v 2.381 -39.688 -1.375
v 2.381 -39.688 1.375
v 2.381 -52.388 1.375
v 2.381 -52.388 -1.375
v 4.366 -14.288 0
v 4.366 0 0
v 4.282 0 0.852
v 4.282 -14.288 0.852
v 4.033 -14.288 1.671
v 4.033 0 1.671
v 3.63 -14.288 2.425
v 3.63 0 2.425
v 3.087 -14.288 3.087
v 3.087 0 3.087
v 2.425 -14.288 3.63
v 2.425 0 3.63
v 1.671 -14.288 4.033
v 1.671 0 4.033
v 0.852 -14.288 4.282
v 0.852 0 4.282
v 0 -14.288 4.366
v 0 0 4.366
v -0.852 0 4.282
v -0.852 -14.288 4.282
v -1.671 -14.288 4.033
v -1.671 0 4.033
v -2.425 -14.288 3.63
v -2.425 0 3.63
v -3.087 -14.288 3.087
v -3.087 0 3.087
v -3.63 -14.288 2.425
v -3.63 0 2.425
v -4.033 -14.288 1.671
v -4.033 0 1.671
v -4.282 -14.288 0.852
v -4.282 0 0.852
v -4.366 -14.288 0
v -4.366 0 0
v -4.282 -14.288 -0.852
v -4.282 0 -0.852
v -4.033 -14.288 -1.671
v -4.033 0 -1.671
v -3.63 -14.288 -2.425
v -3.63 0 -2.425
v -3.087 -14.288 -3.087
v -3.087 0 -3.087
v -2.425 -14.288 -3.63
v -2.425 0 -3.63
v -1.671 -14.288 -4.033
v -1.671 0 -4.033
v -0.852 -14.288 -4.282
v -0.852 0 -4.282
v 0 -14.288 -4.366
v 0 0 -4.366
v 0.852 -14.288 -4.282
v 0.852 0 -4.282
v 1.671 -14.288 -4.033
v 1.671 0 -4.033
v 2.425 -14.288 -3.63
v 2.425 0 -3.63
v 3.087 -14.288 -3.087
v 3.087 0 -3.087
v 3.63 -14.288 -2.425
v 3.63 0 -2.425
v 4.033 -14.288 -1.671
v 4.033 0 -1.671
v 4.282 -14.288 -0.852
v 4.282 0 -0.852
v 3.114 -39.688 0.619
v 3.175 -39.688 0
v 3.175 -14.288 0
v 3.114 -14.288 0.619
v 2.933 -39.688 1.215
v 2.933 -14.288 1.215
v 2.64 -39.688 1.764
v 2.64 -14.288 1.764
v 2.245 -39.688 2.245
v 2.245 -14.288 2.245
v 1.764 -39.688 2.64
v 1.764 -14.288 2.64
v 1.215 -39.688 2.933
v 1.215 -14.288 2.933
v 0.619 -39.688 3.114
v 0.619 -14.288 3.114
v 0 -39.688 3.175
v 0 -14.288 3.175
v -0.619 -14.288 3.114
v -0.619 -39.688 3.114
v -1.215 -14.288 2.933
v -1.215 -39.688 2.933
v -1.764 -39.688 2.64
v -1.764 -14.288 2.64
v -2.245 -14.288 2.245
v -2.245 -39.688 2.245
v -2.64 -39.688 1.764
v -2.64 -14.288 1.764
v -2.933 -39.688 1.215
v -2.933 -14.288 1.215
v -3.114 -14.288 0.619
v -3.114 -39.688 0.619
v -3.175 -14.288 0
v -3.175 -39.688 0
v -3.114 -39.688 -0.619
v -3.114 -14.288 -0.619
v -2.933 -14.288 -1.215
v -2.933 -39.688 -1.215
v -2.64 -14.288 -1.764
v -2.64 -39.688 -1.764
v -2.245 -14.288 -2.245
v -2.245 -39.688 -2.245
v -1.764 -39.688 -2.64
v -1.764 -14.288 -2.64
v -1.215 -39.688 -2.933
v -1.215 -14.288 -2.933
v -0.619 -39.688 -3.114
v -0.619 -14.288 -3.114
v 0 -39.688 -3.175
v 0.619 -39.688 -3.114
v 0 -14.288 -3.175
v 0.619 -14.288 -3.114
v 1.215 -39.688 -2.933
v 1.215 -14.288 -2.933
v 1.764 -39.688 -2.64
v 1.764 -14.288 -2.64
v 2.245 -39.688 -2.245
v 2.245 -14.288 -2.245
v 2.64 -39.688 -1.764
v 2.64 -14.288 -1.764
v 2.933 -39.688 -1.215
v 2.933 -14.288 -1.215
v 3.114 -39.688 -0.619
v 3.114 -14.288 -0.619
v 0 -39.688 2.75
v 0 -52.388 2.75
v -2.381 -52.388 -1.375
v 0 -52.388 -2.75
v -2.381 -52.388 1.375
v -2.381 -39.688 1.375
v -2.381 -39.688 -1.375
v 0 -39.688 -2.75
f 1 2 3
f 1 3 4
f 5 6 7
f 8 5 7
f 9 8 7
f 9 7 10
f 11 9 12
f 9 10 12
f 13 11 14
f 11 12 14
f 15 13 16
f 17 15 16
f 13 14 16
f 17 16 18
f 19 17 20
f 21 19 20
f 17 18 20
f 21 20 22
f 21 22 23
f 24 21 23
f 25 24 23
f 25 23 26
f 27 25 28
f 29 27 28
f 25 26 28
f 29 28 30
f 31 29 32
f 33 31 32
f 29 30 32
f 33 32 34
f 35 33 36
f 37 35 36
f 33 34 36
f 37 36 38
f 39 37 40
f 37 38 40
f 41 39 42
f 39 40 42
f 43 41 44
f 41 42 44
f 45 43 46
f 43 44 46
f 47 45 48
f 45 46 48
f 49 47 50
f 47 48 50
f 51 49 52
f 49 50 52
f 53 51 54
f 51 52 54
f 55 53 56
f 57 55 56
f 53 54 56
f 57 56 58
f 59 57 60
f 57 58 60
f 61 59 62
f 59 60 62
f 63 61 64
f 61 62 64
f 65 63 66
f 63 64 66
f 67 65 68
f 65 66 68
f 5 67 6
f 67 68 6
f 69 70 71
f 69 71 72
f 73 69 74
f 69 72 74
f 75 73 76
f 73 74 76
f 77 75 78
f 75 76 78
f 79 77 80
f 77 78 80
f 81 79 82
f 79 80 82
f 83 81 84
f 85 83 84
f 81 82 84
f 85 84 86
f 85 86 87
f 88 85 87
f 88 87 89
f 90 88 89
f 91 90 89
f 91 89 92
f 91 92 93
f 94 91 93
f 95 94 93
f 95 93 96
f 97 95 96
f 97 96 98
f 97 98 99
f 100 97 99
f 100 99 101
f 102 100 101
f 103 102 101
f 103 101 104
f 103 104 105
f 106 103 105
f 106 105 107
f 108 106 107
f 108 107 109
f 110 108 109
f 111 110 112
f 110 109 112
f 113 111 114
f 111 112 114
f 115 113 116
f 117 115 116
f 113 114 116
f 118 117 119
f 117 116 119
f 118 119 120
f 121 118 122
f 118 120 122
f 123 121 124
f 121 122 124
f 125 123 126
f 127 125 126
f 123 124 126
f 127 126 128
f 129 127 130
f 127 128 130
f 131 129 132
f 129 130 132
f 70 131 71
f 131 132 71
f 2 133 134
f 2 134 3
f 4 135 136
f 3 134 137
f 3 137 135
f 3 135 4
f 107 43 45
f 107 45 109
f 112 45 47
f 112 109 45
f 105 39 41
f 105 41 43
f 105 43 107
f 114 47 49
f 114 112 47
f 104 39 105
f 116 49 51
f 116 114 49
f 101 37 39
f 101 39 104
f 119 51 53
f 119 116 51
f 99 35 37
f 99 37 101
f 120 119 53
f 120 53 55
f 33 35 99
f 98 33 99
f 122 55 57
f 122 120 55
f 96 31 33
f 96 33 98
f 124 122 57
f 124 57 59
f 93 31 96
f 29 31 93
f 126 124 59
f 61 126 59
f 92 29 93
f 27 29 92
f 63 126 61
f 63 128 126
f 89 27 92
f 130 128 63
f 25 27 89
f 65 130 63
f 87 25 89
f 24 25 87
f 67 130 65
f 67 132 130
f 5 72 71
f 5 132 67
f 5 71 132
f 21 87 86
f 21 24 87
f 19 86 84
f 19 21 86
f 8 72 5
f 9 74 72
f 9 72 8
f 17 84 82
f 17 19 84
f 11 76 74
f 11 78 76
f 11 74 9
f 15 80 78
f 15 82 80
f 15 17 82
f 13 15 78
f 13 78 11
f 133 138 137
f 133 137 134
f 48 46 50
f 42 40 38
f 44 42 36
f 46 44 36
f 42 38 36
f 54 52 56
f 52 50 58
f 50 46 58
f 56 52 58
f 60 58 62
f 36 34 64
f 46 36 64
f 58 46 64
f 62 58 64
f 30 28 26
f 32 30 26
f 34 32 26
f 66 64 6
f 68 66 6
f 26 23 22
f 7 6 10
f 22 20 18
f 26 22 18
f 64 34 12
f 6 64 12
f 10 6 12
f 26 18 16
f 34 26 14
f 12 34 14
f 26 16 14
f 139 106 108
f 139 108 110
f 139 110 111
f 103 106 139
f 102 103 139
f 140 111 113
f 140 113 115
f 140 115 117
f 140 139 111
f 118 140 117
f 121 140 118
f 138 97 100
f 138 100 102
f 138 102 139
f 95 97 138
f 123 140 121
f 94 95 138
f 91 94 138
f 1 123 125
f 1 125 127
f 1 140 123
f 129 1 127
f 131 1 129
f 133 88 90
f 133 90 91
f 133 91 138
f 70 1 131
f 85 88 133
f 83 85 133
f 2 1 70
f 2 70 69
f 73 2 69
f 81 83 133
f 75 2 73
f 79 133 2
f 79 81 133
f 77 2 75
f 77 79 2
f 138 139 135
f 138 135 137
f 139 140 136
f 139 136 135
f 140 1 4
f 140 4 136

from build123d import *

# Parameters (mm, degrees)
F0_R     = 4.365625
F1_DEPTH = 14.2875
F2_R     = 3.175
F3_DEPTH = 38.1
F4_R     = 3.175
F5_DEPTH = 12.7


with BuildPart() as f1:
    # F0 (on Front) → F1 (new body)
    with BuildSketch(Plane.XZ):
        Circle(F0_R)
    extrude(amount=F1_DEPTH)

    # F2 (on face) → F3 (join)
    with BuildSketch(Plane.XZ.offset(14.2875)):
        Circle(F2_R)
    extrude(amount=F3_DEPTH)

    # F4 (on face) → F5 (cut)
    with BuildSketch(Plane.XZ.offset(52.3875)):
        Circle(F4_R)
        Polygon((0, -2.749631), (-2.38125, -1.374815), (-2.38125, 1.374815), (0, 2.749631), (2.38125, 1.374815), (2.38125, -1.374815), align=None, mode=Mode.SUBTRACT)
    extrude(amount=-F5_DEPTH, mode=Mode.SUBTRACT)


solid = f1.part
